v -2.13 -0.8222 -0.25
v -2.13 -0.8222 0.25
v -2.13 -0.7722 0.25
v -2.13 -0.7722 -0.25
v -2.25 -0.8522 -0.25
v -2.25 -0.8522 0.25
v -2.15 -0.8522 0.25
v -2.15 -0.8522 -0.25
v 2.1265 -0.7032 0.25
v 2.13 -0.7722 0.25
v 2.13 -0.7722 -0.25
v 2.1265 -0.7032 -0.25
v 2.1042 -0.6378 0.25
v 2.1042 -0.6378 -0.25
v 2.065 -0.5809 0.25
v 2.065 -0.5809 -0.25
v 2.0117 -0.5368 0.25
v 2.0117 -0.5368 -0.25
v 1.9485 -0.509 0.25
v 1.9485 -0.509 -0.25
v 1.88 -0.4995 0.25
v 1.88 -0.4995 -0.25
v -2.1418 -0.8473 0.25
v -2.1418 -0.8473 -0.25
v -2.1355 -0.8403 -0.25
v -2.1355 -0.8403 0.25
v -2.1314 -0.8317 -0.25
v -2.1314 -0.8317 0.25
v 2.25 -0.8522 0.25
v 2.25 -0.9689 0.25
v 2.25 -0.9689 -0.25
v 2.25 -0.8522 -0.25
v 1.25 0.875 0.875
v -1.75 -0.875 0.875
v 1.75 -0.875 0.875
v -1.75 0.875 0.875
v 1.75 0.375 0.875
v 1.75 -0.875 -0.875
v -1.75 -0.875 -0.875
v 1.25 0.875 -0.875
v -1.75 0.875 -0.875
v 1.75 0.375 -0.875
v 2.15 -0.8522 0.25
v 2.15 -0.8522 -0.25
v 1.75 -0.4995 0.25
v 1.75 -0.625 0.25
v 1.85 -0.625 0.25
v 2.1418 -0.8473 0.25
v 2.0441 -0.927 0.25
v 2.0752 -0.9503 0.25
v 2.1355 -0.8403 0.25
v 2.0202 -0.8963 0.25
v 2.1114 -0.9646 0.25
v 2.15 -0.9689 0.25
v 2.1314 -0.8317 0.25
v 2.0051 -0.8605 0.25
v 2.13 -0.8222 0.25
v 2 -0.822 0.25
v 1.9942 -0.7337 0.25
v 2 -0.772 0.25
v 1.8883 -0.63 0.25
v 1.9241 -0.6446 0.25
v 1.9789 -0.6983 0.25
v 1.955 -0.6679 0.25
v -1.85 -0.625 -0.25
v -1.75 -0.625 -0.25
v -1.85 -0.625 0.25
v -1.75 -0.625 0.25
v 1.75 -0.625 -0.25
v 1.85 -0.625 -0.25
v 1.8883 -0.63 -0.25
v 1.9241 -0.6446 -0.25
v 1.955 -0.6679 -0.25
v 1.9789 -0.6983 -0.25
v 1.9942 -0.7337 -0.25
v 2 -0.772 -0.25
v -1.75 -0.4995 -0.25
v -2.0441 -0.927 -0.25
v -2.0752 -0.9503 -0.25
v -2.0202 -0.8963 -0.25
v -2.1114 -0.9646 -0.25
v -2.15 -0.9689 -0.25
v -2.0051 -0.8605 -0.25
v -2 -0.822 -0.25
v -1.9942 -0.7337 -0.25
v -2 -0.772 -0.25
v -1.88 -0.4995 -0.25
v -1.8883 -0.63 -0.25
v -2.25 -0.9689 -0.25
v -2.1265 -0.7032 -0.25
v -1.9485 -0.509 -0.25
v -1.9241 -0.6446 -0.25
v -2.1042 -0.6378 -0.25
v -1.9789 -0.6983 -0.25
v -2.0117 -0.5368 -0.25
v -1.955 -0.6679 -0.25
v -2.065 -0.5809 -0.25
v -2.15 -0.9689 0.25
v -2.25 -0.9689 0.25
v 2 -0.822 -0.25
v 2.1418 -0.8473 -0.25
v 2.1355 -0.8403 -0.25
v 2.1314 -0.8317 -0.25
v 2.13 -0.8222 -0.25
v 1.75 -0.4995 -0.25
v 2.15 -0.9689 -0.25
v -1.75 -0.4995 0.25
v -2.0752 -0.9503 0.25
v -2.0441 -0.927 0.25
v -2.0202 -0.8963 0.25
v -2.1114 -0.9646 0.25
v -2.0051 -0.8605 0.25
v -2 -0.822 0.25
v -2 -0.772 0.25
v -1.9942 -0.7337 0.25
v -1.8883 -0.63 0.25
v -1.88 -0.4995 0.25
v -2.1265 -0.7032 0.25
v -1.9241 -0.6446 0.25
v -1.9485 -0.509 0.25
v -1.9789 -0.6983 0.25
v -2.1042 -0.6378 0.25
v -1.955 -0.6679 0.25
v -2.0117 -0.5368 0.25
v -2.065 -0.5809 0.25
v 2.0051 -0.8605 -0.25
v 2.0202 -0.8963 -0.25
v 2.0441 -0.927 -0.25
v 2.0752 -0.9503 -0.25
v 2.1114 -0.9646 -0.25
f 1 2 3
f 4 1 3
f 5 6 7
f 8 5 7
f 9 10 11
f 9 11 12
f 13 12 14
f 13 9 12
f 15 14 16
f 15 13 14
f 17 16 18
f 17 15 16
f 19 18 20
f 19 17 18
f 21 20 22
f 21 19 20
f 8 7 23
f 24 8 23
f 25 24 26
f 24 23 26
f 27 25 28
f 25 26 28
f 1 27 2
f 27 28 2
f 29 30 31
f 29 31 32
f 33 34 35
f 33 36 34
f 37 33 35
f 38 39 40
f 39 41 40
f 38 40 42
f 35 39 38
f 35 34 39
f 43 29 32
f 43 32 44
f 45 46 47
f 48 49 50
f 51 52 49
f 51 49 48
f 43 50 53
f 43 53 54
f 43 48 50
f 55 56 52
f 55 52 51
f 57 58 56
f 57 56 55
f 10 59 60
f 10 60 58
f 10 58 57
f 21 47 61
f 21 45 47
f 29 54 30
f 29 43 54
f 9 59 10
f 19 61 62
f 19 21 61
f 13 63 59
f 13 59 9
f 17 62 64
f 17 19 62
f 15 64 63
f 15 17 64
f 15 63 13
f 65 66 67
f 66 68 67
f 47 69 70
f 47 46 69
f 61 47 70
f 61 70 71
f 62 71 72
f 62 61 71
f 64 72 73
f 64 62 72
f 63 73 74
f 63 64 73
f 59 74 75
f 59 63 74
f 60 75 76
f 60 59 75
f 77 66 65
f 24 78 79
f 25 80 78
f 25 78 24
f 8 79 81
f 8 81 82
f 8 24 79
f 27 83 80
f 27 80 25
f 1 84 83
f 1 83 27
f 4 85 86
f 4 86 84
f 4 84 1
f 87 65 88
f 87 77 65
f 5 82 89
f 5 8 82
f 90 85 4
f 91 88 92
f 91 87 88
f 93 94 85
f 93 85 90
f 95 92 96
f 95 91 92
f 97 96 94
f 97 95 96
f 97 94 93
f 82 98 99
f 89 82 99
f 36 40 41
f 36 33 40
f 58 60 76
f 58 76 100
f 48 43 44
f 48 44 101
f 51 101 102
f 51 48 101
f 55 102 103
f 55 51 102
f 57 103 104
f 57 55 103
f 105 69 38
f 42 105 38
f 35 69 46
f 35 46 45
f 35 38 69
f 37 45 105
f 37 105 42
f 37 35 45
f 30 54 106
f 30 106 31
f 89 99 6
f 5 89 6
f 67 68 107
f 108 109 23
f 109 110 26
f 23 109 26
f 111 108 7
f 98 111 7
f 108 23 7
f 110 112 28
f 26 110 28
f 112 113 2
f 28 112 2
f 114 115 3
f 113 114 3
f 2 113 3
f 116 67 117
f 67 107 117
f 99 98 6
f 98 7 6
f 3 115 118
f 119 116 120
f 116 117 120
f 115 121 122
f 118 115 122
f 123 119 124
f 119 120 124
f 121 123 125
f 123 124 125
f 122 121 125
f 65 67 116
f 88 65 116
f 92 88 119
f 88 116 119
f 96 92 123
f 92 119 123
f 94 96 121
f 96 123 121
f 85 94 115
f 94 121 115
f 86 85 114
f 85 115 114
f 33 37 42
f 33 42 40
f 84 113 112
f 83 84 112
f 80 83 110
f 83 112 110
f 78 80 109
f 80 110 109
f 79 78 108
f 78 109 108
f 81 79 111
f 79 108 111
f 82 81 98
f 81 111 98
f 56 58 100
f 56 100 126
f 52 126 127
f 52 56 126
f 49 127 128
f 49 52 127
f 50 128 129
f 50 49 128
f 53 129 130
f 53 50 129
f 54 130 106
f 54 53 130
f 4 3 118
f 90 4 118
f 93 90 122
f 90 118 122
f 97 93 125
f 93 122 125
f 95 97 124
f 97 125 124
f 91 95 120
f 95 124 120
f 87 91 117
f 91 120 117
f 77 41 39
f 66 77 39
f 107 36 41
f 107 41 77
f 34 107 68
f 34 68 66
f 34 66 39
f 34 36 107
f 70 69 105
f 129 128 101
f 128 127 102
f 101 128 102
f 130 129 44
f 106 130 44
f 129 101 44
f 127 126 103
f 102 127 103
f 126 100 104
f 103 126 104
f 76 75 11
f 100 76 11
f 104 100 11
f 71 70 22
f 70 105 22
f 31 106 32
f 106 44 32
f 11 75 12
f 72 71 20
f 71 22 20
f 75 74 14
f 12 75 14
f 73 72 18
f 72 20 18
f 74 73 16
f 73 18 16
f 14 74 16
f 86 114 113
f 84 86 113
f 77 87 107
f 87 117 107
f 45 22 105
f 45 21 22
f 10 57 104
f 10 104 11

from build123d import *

# Parameters (mm, degrees)
EXTRUDE1_DEPTH = 0.875
EXTRUDE2_DEPTH = 0.25


with BuildPart() as part:
    # Sketch1 → Extrude1 (new body, symmetric)
    with BuildSketch(Plane.XY):
        Polygon((-1.75, -0.875), (1.75, -0.875), (1.75, 0.375), (1.25, 0.875), (-1.75, 0.875), align=None)
    extrude(amount=EXTRUDE1_DEPTH, both=True)

    # Sketch2 → Extrude2 (add, symmetric)
    with BuildSketch(Plane.XY):
        with BuildLine():
            Line((1.75, -0.625), (1.85, -0.625))
            ThreePointArc((1.85, -0.625), (1.955, -0.66786607), (2, -0.771969385))
            Line((2, -0.771969385), (2, -0.821969385))
            ThreePointArc((2, -0.821969385), (2.044121431, -0.926969385), (2.15, -0.968938769))
            Line((2.15, -0.968938769), (2.25, -0.968938769))
            Line((2.25, -0.968938769), (2.25, -0.852248548))
            Line((2.25, -0.852248548), (2.15, -0.852248548))
            ThreePointArc((2.15, -0.852248548), (2.135458365, -0.840276305), (2.13, -0.822248548))
            Line((2.13, -0.822248548), (2.13, -0.772248548))
            ThreePointArc((2.13, -0.772248548), (2.065, -0.580874063), (1.88, -0.499484914))
            Line((1.88, -0.499484914), (1.75, -0.499484914))
            Line((1.75, -0.499484914), (1.75, -0.625))
        make_face()
    extrude2 = extrude(amount=EXTRUDE2_DEPTH, both=True)

    # Mirror1: Extrude2 across plane
    add(extrude2.mirror(Plane(origin=(0, 0, 0), x_dir=(0, 0, 1), z_dir=(1, 0, 0))))


solid = part.part
